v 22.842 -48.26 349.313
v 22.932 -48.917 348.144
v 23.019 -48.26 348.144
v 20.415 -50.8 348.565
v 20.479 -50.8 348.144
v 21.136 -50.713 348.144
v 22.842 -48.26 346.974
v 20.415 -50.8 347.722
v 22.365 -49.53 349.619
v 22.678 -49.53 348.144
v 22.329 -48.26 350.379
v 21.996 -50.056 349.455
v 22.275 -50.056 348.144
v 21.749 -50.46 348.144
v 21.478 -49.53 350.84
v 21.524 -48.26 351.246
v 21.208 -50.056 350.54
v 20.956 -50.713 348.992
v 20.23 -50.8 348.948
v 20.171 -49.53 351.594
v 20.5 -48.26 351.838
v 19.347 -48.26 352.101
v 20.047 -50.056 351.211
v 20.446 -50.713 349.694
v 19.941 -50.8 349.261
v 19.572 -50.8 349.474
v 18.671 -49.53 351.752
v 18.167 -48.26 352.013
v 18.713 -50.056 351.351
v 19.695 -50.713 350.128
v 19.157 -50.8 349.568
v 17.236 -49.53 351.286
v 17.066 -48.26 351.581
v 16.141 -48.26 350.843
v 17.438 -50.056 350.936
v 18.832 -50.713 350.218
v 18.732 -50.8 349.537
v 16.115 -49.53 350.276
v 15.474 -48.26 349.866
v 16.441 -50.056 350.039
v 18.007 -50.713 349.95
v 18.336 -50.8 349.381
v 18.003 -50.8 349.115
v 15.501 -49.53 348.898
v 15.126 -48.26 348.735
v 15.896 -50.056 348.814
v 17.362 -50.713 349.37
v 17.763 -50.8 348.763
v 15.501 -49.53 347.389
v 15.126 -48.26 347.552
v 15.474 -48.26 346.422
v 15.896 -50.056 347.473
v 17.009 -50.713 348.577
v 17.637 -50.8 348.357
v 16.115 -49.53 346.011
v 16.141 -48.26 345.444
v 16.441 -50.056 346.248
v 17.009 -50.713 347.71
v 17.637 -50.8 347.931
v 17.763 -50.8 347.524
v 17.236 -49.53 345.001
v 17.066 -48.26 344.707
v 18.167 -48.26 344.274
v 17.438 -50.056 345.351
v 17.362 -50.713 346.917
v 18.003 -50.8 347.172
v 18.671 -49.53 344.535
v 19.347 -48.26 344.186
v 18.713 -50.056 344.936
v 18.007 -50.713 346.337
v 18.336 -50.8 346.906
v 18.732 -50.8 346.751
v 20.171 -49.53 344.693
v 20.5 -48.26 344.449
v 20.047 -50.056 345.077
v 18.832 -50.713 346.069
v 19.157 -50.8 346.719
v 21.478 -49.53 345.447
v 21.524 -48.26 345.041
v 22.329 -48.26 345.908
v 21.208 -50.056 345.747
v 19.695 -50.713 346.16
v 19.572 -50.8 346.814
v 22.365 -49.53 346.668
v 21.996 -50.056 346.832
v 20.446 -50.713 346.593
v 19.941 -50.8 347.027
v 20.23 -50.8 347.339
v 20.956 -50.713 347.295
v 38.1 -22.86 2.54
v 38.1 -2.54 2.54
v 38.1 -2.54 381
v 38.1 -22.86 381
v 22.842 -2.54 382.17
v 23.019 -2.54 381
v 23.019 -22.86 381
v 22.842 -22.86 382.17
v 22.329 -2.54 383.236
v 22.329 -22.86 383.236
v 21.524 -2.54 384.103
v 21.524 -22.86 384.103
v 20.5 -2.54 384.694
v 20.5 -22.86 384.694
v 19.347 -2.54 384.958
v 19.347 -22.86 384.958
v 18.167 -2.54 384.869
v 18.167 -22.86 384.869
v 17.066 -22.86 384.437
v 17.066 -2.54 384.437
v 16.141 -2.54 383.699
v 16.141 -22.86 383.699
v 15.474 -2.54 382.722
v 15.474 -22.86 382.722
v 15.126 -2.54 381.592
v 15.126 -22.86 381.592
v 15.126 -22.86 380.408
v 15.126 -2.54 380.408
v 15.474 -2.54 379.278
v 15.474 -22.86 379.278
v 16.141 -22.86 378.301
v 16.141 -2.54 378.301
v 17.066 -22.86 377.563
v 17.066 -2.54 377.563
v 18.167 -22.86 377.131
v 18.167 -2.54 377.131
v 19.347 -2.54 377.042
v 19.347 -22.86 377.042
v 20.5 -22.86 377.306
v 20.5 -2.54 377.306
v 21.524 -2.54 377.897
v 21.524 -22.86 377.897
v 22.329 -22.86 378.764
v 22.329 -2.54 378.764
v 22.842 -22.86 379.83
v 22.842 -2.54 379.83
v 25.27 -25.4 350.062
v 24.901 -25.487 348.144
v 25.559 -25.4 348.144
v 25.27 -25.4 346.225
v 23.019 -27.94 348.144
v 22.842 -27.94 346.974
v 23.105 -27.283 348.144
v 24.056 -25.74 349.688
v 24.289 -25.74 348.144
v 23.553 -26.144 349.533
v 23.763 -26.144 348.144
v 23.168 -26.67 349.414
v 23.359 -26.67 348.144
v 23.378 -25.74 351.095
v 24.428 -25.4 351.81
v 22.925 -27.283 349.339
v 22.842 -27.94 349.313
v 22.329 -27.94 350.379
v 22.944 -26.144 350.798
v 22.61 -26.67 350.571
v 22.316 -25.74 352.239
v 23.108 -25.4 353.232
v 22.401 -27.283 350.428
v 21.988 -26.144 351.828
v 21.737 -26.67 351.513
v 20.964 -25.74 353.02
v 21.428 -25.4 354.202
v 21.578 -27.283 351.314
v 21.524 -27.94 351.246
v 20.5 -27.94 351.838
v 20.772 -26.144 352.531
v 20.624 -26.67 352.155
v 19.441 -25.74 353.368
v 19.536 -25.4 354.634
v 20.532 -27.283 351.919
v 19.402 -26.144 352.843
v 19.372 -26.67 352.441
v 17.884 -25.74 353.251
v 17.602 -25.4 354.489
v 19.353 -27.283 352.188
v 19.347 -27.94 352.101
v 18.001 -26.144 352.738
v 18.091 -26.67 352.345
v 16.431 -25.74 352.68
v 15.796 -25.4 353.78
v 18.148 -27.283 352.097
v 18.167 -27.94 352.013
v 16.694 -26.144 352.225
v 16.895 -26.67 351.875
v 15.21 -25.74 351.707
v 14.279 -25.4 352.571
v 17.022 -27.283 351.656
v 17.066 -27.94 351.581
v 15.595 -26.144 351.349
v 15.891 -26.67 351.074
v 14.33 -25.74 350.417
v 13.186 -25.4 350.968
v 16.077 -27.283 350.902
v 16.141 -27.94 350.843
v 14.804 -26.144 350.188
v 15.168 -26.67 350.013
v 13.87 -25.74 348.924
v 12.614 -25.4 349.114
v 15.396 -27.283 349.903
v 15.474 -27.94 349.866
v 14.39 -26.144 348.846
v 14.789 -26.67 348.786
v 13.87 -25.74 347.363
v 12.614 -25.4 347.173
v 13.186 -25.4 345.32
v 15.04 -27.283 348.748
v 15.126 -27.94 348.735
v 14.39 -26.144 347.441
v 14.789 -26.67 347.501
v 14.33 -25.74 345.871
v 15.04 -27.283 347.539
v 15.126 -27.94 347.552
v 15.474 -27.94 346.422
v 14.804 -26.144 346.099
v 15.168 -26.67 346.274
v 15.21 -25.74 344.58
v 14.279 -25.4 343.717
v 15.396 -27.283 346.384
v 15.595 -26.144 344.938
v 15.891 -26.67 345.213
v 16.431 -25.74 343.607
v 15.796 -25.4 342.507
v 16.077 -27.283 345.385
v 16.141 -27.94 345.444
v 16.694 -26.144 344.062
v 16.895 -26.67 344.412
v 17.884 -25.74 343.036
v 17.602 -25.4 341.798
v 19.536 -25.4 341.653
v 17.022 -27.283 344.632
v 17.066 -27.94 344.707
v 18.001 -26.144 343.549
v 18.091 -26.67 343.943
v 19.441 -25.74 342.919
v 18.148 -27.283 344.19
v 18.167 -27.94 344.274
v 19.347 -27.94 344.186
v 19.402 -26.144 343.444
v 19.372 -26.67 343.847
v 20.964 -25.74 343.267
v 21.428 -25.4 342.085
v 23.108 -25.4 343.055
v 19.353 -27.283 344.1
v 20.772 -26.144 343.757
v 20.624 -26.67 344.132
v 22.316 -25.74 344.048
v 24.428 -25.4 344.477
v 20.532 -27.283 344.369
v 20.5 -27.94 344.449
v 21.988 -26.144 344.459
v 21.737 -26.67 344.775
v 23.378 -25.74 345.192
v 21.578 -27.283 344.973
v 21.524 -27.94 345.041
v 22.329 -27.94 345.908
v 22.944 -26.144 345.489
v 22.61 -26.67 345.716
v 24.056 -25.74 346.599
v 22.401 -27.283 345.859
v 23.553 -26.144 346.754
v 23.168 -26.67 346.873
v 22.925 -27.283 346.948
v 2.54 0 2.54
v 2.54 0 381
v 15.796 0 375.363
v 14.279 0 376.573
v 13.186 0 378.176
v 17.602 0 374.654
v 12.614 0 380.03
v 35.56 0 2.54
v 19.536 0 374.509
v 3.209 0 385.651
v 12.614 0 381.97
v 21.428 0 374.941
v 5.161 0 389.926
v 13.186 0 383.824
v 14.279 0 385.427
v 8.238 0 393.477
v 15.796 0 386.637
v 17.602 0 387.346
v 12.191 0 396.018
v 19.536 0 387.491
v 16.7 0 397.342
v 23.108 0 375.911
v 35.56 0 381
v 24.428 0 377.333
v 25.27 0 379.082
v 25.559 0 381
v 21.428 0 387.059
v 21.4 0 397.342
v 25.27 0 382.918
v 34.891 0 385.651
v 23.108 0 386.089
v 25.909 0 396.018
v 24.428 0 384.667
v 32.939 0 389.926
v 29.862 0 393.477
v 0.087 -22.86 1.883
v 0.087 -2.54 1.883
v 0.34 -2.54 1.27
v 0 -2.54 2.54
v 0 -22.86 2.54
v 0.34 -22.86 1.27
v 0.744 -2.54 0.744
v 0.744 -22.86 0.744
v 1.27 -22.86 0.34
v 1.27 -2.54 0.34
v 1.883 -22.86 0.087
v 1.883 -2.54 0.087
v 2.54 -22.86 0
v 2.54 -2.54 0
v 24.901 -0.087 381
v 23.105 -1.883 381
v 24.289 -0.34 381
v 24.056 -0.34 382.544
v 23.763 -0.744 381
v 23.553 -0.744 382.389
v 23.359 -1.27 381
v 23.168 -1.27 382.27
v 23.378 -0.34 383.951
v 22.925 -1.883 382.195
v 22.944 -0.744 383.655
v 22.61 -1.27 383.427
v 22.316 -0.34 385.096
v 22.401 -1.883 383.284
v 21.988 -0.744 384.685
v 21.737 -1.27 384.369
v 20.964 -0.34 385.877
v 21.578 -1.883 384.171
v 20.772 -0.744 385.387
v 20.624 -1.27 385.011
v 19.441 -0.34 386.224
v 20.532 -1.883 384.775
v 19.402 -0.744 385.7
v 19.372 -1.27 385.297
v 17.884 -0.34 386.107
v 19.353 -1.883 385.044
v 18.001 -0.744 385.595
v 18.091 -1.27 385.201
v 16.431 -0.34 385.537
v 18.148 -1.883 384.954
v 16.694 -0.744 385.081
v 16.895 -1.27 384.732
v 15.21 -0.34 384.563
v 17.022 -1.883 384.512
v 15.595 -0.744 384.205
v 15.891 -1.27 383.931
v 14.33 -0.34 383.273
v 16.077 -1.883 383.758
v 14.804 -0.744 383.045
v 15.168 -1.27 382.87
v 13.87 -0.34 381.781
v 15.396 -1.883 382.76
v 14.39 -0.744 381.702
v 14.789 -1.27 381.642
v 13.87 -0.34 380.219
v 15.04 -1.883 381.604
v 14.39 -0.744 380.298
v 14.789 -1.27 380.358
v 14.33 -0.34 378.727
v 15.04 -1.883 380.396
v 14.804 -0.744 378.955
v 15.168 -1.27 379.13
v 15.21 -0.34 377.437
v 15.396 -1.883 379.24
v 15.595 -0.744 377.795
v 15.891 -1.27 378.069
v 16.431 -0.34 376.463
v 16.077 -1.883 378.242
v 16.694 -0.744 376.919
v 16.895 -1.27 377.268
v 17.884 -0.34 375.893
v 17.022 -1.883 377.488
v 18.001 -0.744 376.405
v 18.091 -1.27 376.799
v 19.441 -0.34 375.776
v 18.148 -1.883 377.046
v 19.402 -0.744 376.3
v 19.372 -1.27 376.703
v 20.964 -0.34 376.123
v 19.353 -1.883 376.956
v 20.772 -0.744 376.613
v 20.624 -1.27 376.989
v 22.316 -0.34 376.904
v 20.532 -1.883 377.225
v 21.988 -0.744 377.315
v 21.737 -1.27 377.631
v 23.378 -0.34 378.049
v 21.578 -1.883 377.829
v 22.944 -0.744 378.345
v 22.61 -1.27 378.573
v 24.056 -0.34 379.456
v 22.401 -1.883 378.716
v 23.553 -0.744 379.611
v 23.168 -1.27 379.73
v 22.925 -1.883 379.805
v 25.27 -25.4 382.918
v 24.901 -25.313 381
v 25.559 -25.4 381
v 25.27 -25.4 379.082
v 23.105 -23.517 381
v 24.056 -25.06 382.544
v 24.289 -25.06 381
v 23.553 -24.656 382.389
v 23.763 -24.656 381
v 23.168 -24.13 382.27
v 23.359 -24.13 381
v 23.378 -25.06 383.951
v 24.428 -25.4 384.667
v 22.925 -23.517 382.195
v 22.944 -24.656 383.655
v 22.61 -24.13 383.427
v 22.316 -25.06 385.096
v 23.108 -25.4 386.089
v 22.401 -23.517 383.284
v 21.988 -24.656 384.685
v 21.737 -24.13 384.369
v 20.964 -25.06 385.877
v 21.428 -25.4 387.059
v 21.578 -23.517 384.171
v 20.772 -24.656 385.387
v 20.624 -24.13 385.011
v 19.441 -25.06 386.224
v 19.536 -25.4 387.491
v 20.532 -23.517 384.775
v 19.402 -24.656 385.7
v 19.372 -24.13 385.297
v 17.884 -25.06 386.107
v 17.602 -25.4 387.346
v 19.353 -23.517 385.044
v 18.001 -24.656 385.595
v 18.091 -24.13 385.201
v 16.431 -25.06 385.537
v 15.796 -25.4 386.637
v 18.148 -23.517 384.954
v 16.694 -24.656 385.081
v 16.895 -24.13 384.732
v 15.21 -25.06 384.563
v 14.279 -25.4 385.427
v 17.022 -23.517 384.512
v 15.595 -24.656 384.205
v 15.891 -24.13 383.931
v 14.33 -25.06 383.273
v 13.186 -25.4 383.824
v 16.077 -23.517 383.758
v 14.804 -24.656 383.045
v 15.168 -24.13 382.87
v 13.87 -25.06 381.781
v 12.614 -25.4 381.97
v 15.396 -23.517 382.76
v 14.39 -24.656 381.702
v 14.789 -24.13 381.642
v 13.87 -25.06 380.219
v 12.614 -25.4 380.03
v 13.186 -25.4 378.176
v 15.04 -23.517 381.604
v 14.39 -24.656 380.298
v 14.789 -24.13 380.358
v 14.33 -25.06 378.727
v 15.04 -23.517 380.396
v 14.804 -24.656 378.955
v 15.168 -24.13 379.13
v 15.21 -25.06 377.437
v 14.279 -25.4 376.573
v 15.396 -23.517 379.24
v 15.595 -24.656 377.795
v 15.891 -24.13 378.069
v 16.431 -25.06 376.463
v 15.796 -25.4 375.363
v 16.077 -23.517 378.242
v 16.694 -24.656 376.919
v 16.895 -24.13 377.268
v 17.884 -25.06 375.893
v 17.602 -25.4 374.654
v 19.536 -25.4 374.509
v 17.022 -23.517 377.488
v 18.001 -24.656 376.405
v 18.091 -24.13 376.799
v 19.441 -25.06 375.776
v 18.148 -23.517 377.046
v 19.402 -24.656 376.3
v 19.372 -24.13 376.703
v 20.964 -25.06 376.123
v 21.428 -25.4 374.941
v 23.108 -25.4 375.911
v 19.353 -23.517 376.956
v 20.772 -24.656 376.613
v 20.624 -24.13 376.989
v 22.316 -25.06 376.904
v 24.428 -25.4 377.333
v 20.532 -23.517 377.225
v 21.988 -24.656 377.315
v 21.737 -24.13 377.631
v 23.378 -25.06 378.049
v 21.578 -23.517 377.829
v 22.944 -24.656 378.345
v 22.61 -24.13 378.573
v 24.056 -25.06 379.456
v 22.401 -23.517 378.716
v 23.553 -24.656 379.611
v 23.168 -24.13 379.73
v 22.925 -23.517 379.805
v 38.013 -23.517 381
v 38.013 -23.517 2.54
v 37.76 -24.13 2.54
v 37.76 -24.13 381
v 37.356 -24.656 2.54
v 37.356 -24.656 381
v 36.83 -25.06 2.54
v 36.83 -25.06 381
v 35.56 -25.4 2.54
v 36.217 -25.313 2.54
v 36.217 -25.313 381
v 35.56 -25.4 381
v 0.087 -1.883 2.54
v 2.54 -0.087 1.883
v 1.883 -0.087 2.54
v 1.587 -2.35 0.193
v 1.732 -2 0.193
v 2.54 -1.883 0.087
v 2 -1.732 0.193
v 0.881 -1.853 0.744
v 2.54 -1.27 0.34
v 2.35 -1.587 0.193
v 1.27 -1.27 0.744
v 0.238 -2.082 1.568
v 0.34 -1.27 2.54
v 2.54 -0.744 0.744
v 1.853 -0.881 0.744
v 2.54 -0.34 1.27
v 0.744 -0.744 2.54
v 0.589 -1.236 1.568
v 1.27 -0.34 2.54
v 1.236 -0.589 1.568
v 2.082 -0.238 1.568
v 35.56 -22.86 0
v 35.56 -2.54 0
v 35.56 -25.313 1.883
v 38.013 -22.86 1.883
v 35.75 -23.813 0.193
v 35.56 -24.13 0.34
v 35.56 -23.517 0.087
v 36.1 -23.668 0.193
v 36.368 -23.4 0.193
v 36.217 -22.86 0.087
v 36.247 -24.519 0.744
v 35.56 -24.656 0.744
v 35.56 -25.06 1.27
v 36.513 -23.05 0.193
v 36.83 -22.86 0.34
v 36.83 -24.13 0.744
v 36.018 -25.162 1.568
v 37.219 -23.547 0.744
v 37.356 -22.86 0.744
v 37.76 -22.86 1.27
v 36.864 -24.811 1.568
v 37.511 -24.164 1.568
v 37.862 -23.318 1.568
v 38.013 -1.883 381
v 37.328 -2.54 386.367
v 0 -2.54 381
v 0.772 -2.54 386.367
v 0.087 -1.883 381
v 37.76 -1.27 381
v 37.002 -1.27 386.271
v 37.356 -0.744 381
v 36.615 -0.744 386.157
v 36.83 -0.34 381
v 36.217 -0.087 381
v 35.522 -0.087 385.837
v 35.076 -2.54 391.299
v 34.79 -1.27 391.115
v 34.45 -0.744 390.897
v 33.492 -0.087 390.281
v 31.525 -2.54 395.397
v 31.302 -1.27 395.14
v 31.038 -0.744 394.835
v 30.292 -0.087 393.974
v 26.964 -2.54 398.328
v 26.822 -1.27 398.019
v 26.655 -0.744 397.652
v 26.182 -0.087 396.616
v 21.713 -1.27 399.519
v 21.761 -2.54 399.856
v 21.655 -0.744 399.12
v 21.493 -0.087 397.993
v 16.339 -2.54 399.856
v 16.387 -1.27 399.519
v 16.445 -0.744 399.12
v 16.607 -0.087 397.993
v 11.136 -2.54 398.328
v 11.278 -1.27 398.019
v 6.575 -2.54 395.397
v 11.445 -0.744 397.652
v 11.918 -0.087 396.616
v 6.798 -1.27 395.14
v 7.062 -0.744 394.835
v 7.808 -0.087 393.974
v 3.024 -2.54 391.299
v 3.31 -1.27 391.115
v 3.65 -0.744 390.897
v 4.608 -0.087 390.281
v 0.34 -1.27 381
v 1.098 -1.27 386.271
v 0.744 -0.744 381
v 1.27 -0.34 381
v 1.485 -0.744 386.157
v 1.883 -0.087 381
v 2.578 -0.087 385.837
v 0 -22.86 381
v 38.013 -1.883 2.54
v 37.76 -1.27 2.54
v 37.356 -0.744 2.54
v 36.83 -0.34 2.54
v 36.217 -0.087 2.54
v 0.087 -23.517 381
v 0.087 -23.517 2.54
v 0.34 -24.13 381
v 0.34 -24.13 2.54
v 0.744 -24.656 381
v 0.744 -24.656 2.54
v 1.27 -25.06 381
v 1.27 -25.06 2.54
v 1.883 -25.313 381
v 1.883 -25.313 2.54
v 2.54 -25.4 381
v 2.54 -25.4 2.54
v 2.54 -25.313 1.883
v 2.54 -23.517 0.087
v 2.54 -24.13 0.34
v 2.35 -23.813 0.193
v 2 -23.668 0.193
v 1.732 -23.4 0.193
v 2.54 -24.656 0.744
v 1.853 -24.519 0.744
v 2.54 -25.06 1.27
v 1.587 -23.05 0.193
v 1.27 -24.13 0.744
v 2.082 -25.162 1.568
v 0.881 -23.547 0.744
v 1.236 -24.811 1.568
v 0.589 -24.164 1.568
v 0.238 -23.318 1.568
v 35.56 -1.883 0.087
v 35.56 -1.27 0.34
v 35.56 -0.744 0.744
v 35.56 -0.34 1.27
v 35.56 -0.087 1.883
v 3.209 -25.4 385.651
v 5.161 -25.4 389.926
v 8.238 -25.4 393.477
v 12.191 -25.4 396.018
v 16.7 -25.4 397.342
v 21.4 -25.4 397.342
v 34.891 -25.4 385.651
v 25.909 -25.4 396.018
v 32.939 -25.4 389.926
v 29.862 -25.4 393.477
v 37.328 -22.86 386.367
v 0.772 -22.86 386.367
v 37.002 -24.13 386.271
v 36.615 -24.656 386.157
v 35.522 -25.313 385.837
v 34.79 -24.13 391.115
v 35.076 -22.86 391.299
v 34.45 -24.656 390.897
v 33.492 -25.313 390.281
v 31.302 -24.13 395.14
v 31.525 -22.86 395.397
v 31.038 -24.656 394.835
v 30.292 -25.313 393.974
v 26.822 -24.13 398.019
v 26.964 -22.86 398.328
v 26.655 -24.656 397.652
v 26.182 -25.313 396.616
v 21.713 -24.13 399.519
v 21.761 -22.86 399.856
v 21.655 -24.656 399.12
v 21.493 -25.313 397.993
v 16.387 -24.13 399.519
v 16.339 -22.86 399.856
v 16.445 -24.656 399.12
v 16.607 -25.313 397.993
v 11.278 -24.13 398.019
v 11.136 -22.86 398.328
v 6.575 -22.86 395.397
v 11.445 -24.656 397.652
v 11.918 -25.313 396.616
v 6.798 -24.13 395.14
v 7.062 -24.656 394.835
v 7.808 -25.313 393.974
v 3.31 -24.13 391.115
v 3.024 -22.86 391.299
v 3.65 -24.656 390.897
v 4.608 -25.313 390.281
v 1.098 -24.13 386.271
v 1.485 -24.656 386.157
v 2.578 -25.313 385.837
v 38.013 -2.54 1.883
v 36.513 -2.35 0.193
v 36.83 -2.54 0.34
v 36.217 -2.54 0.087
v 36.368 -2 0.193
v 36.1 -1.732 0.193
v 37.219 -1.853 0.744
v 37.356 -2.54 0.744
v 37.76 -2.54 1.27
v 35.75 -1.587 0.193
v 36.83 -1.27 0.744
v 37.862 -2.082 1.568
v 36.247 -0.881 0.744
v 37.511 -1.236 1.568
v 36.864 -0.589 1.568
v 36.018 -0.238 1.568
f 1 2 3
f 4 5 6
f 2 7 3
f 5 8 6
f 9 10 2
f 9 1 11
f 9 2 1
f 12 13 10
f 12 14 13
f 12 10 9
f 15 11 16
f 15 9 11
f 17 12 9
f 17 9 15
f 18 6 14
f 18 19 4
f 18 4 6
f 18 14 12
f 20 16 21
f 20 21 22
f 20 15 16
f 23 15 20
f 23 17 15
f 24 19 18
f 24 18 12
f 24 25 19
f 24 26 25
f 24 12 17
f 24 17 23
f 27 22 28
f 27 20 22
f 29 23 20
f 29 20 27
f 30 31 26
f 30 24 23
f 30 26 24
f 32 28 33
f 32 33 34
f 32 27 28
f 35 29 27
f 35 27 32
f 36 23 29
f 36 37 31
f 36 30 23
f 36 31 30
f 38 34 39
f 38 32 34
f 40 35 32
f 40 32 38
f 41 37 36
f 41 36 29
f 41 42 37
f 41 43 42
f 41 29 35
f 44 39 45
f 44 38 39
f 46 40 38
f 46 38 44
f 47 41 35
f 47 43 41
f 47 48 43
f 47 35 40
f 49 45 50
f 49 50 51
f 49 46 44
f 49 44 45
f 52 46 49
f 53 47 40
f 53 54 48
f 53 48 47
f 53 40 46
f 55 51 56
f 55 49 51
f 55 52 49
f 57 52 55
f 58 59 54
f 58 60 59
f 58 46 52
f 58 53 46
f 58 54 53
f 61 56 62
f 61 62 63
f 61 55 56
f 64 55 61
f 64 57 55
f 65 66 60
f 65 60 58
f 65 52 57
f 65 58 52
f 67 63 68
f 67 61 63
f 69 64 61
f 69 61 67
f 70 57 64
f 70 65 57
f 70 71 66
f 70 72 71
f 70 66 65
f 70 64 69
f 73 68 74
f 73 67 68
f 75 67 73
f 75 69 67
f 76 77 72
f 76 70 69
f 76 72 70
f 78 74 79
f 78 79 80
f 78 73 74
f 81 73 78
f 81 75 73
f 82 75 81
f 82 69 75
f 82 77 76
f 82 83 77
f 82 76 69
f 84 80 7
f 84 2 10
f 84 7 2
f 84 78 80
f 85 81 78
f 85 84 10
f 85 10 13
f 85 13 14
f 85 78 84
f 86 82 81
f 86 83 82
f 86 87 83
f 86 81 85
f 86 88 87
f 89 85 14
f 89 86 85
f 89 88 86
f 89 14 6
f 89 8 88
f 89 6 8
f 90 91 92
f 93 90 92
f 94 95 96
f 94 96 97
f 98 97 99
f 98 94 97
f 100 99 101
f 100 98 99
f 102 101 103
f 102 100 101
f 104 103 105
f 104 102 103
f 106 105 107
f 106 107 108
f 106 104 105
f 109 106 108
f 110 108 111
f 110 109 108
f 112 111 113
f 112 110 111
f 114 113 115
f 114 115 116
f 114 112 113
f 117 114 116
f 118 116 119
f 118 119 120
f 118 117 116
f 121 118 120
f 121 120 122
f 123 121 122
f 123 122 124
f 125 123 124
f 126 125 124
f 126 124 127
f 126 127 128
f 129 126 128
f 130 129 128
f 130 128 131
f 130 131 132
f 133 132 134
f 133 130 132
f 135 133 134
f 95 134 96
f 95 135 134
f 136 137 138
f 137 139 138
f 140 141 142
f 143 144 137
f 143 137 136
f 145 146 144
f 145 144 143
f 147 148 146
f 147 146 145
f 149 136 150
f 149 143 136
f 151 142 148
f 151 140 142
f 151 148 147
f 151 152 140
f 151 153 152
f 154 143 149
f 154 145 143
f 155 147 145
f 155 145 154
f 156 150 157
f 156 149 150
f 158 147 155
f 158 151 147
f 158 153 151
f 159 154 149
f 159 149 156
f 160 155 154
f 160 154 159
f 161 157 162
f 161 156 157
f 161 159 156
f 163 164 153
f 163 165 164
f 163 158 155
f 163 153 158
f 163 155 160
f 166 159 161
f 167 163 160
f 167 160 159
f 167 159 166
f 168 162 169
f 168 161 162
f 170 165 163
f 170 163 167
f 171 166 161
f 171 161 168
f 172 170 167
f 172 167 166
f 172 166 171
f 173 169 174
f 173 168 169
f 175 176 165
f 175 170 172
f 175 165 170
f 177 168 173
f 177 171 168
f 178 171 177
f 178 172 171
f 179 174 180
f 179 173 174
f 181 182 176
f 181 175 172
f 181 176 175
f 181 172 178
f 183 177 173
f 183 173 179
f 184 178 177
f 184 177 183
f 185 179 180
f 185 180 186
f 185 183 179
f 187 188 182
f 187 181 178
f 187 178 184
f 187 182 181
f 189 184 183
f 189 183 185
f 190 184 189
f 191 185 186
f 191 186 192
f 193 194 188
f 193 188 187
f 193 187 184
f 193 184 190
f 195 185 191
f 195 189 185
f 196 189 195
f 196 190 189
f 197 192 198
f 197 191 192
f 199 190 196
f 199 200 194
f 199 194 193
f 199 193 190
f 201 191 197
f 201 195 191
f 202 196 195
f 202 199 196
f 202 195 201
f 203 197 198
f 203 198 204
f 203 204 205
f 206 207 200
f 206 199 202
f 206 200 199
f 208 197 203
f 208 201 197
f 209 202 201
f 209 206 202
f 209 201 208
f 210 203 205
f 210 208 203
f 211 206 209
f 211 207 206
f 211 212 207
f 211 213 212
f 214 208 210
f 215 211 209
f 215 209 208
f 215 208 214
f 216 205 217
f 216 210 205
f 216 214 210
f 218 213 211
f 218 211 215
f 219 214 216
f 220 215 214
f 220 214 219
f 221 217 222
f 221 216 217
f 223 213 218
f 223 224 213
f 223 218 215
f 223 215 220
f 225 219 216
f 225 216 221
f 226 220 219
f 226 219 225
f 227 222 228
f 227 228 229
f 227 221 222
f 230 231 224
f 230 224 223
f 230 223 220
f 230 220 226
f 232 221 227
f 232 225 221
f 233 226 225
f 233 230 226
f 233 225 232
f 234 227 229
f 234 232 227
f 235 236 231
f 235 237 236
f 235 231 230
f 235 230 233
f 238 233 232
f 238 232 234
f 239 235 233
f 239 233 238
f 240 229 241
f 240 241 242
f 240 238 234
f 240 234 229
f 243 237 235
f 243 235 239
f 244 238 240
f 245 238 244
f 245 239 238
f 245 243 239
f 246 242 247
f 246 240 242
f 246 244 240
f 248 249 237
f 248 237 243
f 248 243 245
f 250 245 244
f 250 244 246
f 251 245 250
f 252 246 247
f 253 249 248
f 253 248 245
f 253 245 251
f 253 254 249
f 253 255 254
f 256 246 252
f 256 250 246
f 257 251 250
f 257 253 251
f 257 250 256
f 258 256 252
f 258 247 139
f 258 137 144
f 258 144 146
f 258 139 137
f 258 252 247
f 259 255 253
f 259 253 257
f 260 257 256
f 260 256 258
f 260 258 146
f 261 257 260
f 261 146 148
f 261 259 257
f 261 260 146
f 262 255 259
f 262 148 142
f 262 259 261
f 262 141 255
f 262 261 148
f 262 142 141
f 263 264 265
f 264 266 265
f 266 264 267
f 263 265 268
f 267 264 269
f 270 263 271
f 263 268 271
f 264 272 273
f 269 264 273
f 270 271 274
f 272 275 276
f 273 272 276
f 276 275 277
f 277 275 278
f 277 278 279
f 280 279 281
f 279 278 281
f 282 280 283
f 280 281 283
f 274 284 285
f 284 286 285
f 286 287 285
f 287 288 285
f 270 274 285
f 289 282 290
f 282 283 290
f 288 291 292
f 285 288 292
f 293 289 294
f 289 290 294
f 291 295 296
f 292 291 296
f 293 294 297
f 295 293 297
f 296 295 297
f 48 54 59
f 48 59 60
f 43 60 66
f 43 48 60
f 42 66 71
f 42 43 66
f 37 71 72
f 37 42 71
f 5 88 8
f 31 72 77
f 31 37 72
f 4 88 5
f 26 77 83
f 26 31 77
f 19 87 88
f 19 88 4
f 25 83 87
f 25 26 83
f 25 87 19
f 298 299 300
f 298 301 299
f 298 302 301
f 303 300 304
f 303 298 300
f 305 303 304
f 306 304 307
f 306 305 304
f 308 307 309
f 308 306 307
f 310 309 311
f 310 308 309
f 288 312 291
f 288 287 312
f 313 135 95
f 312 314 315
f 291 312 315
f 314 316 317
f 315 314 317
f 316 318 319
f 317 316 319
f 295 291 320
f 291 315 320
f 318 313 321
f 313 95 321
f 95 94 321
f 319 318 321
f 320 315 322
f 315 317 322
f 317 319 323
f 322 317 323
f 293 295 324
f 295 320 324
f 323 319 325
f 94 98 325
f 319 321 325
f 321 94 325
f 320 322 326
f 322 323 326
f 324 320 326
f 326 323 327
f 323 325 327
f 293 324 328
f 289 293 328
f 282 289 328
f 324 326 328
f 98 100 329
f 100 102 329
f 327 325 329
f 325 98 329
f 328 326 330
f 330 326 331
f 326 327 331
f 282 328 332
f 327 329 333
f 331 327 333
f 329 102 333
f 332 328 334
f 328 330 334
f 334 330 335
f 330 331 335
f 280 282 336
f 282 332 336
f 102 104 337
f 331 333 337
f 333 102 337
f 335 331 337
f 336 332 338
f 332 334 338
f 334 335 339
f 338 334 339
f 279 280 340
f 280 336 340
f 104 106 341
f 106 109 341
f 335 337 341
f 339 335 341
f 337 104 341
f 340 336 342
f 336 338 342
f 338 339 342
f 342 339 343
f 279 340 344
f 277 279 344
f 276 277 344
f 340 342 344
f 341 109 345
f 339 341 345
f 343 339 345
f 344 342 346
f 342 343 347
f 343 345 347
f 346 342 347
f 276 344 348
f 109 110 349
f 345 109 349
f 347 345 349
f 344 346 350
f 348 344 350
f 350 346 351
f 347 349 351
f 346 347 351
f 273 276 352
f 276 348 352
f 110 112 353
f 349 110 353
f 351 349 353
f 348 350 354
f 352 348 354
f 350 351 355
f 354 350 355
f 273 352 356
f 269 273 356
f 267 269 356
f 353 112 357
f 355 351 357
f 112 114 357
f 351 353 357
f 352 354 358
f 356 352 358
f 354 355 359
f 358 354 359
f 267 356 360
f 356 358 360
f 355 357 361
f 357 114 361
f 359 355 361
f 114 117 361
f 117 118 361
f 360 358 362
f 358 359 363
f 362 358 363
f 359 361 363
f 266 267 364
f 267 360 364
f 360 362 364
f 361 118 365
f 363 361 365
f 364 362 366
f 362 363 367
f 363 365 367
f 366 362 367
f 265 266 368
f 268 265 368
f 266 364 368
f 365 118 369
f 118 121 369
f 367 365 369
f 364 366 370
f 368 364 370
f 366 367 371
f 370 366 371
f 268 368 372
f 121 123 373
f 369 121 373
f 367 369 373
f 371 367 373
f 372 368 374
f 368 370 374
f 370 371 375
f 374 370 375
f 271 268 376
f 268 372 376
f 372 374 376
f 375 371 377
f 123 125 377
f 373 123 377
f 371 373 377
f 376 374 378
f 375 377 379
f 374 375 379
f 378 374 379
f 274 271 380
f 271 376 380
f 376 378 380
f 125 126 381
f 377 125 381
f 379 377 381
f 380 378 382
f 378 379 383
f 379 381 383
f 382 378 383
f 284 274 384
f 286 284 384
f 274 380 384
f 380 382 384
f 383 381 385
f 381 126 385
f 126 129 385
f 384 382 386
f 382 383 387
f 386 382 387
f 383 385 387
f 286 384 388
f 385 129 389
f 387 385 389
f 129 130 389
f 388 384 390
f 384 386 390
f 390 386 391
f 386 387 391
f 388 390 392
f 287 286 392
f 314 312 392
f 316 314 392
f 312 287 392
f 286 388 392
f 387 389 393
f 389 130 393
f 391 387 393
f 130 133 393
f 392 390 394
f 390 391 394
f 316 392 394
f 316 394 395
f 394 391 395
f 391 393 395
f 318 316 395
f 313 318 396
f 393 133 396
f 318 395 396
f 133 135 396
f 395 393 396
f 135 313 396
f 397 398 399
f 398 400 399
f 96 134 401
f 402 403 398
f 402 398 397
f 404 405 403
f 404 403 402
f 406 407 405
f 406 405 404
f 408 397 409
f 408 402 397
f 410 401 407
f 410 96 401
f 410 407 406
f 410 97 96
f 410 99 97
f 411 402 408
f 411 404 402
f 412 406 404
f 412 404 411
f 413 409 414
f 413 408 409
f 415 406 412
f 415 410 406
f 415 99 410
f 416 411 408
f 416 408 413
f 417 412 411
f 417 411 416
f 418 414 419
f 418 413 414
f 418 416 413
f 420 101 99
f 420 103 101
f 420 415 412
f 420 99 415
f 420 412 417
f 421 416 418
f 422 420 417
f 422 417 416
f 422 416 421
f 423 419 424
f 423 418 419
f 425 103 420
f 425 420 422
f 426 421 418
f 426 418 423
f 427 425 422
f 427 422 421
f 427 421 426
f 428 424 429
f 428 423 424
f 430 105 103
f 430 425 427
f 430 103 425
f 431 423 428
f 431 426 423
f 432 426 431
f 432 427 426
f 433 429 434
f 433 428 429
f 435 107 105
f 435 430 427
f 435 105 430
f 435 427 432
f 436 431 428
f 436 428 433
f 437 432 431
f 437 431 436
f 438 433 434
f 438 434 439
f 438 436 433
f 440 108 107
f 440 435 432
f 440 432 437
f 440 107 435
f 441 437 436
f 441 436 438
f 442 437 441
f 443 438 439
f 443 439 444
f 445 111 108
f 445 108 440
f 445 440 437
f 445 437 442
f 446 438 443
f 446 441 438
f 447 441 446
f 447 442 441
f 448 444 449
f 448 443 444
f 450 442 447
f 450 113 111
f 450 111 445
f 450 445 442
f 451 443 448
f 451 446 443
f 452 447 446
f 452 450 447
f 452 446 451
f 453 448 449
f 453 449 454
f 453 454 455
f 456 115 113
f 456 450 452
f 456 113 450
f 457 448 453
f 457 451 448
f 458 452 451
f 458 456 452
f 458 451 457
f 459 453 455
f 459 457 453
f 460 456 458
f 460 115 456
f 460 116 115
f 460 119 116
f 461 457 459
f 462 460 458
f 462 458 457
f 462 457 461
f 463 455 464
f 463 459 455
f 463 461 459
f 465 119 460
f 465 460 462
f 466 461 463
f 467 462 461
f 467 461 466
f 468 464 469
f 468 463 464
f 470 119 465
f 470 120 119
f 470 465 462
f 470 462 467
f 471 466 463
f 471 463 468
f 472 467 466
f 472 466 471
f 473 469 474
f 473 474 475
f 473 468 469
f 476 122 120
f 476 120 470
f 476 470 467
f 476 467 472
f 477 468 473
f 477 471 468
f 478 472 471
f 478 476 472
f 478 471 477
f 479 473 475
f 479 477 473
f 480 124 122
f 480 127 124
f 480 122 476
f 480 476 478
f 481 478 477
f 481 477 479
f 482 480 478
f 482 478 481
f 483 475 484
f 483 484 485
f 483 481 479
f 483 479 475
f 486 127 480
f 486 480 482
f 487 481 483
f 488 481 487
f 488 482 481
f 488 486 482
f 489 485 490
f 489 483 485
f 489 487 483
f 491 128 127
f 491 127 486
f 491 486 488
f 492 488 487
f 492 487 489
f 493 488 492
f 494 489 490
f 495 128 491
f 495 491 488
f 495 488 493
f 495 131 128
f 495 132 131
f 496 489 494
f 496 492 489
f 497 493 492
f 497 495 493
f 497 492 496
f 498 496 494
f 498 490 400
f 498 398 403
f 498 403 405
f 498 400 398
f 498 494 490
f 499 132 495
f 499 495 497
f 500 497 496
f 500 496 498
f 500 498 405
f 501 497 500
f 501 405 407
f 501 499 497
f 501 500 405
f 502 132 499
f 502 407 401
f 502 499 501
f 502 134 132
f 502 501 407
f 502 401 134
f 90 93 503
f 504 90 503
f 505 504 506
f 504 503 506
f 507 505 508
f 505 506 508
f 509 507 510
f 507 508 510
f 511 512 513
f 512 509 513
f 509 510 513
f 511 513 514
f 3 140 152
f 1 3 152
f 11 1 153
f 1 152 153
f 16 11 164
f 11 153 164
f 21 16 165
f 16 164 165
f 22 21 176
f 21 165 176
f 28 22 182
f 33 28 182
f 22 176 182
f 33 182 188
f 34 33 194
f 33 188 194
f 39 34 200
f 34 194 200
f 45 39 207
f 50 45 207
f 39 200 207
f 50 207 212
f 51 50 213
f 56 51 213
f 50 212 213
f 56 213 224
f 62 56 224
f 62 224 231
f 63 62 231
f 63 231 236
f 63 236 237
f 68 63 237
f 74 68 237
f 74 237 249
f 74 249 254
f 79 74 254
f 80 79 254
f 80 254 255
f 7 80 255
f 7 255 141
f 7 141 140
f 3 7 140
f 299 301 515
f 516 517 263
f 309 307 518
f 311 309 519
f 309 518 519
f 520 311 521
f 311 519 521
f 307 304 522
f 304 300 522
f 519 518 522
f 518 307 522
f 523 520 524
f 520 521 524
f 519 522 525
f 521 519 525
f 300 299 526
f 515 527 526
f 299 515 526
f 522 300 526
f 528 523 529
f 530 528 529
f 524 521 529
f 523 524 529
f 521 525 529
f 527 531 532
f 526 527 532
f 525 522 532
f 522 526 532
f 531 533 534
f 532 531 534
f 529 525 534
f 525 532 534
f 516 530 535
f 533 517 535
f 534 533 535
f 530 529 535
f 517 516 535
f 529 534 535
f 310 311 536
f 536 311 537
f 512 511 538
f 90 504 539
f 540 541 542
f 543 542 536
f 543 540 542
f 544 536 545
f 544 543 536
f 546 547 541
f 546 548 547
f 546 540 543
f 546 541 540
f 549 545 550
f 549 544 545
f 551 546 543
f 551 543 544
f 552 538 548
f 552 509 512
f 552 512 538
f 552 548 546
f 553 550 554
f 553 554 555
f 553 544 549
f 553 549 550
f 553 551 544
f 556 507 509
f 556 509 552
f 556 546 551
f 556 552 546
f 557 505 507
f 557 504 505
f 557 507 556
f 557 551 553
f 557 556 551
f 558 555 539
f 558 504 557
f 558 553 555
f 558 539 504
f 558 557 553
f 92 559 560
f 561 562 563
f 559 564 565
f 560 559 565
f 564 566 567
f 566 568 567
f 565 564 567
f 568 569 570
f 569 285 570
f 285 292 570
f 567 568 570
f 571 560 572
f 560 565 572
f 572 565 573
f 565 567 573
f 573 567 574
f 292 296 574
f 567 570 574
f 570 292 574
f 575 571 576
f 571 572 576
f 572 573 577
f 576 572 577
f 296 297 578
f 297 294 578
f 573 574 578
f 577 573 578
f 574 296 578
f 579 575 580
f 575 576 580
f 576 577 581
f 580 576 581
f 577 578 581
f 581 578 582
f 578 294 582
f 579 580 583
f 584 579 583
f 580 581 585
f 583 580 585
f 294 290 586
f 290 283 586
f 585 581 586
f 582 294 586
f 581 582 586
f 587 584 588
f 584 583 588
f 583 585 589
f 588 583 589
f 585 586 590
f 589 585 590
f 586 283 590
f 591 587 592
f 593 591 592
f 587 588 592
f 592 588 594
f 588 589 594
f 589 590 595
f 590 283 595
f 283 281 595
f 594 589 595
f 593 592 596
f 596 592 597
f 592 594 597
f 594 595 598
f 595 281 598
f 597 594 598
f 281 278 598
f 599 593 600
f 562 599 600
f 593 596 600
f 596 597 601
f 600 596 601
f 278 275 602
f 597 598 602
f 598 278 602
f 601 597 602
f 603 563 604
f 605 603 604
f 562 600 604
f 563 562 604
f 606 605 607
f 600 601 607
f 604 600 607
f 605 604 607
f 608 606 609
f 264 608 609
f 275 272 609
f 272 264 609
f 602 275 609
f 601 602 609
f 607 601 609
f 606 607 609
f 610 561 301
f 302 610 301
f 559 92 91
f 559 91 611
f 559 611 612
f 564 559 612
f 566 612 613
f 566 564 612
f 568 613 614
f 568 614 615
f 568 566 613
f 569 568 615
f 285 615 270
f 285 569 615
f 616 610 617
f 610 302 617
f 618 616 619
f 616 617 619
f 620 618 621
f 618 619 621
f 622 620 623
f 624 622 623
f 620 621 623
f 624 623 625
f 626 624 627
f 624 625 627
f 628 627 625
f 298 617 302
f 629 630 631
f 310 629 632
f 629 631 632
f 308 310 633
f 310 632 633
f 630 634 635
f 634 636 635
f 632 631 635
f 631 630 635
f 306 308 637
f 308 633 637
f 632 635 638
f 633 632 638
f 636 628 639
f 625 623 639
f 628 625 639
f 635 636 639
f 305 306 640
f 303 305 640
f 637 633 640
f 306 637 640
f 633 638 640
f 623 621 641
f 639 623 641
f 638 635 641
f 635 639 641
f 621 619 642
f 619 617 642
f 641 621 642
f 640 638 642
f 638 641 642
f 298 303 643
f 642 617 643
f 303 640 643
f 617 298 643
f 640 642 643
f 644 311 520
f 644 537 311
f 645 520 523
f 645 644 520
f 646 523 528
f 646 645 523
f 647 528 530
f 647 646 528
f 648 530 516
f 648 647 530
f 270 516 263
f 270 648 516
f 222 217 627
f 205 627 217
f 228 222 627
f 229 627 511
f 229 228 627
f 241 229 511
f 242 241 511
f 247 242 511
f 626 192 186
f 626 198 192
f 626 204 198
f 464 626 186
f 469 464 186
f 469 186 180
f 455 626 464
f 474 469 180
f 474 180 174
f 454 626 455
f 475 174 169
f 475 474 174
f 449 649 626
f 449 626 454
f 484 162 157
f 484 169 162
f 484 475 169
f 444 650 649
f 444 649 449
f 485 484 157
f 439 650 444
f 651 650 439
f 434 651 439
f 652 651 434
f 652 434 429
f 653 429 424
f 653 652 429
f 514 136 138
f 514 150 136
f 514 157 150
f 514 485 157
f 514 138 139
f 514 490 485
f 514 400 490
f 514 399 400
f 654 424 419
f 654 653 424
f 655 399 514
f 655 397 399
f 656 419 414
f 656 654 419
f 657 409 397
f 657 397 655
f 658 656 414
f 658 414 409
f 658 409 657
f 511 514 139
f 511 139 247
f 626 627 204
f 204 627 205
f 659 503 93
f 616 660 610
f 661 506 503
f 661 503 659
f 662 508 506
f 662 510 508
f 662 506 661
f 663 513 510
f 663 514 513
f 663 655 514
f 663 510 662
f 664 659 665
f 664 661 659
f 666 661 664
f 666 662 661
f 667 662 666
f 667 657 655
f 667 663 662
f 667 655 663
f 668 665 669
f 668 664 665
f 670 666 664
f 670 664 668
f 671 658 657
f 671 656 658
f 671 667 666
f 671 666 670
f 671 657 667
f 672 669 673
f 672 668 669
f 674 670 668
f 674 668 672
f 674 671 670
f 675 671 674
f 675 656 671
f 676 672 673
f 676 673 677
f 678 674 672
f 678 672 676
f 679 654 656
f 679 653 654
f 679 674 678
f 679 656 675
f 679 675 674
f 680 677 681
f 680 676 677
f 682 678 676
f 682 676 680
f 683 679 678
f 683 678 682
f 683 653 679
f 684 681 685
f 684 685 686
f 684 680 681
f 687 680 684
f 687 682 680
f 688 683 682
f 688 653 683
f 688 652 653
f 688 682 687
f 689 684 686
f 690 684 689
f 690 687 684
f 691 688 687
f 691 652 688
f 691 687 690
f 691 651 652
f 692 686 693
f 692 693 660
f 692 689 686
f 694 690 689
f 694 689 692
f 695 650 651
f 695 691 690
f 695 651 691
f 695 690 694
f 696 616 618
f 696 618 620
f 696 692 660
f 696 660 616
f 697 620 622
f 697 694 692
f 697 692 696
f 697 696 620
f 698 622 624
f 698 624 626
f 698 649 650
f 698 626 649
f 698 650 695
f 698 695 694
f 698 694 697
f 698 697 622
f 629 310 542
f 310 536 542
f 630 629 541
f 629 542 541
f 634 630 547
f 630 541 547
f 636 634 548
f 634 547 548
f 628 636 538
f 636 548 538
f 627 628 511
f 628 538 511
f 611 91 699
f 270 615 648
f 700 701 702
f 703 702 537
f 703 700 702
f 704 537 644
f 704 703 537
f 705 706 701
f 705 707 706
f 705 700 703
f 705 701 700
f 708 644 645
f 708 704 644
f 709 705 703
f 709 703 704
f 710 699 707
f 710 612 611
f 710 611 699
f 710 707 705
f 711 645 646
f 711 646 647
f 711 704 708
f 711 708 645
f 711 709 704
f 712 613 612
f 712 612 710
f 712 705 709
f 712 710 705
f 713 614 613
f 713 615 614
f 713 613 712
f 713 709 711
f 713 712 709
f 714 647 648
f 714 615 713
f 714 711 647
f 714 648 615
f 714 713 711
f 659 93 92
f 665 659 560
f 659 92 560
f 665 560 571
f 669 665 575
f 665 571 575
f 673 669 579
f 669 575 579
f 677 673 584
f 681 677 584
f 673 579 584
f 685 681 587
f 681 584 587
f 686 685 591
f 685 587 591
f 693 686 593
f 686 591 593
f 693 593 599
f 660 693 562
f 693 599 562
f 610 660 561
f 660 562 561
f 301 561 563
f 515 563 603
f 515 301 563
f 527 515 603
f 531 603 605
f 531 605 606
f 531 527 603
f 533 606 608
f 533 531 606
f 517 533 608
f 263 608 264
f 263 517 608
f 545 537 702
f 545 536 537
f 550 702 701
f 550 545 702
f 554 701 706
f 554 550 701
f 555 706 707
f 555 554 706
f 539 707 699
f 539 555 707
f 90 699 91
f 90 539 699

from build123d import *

# Parameters (mm, degrees)
F0_R     = 3.96875
F1_DEPTH = 50.8
F2_DEPTH = 25.4
F3_R     = 2.54


with BuildPart() as f1:
    # F0 (on Front) → F1 (new body)
    with BuildSketch(Plane.XZ):
        with Locations((19.05, 348.1435775757)):
            Circle(F0_R)
    extrude(amount=F1_DEPTH)

    # F0 (on Front) → F2 (join)
    with BuildSketch(Plane.XZ):
        with BuildLine():
            Line((0, 381), (0, 0))
            Line((0, 0), (38.1, 0))
            Line((38.1, 0), (38.1, 381))
            ThreePointArc((38.1, 381), (19.05, 400.05), (0, 381))
        make_face()
        with Locations((19.05, 348.1435775757)):
            Circle(F0_R, mode=Mode.SUBTRACT)
        with Locations((19.05, 381)):
            Circle(F0_R, mode=Mode.SUBTRACT)
    extrude(amount=F2_DEPTH)

    # F3
    f3_edges = [f1.edges().sort_by_distance(p)[0] for p in [
        (15.08125, -25.4, 348.143578),
        (23.01875, -38.1, 348.143578),
        (15.08125, -50.8, 348.143578),
        (19.05, -25.4, 400.05),
        (0, -25.4, 190.5),
        (19.05, -25.4, 0),
        (38.1, -25.4, 190.5),
        (15.08125, -25.4, 381),
        (38.1, -12.7, 381),
        (0, -12.7, 381),
        (19.05, 0, 400.05),
        (0, -12.7, 0),
        (0, 0, 190.5),
        (23.01875, -12.7, 381),
        (15.08125, 0, 381),
        (38.1, -12.7, 0),
        (38.1, 0, 190.5),
        (19.05, 0, 0),
    ]]
    fillet(f3_edges, radius=F3_R)


solid = f1.part
